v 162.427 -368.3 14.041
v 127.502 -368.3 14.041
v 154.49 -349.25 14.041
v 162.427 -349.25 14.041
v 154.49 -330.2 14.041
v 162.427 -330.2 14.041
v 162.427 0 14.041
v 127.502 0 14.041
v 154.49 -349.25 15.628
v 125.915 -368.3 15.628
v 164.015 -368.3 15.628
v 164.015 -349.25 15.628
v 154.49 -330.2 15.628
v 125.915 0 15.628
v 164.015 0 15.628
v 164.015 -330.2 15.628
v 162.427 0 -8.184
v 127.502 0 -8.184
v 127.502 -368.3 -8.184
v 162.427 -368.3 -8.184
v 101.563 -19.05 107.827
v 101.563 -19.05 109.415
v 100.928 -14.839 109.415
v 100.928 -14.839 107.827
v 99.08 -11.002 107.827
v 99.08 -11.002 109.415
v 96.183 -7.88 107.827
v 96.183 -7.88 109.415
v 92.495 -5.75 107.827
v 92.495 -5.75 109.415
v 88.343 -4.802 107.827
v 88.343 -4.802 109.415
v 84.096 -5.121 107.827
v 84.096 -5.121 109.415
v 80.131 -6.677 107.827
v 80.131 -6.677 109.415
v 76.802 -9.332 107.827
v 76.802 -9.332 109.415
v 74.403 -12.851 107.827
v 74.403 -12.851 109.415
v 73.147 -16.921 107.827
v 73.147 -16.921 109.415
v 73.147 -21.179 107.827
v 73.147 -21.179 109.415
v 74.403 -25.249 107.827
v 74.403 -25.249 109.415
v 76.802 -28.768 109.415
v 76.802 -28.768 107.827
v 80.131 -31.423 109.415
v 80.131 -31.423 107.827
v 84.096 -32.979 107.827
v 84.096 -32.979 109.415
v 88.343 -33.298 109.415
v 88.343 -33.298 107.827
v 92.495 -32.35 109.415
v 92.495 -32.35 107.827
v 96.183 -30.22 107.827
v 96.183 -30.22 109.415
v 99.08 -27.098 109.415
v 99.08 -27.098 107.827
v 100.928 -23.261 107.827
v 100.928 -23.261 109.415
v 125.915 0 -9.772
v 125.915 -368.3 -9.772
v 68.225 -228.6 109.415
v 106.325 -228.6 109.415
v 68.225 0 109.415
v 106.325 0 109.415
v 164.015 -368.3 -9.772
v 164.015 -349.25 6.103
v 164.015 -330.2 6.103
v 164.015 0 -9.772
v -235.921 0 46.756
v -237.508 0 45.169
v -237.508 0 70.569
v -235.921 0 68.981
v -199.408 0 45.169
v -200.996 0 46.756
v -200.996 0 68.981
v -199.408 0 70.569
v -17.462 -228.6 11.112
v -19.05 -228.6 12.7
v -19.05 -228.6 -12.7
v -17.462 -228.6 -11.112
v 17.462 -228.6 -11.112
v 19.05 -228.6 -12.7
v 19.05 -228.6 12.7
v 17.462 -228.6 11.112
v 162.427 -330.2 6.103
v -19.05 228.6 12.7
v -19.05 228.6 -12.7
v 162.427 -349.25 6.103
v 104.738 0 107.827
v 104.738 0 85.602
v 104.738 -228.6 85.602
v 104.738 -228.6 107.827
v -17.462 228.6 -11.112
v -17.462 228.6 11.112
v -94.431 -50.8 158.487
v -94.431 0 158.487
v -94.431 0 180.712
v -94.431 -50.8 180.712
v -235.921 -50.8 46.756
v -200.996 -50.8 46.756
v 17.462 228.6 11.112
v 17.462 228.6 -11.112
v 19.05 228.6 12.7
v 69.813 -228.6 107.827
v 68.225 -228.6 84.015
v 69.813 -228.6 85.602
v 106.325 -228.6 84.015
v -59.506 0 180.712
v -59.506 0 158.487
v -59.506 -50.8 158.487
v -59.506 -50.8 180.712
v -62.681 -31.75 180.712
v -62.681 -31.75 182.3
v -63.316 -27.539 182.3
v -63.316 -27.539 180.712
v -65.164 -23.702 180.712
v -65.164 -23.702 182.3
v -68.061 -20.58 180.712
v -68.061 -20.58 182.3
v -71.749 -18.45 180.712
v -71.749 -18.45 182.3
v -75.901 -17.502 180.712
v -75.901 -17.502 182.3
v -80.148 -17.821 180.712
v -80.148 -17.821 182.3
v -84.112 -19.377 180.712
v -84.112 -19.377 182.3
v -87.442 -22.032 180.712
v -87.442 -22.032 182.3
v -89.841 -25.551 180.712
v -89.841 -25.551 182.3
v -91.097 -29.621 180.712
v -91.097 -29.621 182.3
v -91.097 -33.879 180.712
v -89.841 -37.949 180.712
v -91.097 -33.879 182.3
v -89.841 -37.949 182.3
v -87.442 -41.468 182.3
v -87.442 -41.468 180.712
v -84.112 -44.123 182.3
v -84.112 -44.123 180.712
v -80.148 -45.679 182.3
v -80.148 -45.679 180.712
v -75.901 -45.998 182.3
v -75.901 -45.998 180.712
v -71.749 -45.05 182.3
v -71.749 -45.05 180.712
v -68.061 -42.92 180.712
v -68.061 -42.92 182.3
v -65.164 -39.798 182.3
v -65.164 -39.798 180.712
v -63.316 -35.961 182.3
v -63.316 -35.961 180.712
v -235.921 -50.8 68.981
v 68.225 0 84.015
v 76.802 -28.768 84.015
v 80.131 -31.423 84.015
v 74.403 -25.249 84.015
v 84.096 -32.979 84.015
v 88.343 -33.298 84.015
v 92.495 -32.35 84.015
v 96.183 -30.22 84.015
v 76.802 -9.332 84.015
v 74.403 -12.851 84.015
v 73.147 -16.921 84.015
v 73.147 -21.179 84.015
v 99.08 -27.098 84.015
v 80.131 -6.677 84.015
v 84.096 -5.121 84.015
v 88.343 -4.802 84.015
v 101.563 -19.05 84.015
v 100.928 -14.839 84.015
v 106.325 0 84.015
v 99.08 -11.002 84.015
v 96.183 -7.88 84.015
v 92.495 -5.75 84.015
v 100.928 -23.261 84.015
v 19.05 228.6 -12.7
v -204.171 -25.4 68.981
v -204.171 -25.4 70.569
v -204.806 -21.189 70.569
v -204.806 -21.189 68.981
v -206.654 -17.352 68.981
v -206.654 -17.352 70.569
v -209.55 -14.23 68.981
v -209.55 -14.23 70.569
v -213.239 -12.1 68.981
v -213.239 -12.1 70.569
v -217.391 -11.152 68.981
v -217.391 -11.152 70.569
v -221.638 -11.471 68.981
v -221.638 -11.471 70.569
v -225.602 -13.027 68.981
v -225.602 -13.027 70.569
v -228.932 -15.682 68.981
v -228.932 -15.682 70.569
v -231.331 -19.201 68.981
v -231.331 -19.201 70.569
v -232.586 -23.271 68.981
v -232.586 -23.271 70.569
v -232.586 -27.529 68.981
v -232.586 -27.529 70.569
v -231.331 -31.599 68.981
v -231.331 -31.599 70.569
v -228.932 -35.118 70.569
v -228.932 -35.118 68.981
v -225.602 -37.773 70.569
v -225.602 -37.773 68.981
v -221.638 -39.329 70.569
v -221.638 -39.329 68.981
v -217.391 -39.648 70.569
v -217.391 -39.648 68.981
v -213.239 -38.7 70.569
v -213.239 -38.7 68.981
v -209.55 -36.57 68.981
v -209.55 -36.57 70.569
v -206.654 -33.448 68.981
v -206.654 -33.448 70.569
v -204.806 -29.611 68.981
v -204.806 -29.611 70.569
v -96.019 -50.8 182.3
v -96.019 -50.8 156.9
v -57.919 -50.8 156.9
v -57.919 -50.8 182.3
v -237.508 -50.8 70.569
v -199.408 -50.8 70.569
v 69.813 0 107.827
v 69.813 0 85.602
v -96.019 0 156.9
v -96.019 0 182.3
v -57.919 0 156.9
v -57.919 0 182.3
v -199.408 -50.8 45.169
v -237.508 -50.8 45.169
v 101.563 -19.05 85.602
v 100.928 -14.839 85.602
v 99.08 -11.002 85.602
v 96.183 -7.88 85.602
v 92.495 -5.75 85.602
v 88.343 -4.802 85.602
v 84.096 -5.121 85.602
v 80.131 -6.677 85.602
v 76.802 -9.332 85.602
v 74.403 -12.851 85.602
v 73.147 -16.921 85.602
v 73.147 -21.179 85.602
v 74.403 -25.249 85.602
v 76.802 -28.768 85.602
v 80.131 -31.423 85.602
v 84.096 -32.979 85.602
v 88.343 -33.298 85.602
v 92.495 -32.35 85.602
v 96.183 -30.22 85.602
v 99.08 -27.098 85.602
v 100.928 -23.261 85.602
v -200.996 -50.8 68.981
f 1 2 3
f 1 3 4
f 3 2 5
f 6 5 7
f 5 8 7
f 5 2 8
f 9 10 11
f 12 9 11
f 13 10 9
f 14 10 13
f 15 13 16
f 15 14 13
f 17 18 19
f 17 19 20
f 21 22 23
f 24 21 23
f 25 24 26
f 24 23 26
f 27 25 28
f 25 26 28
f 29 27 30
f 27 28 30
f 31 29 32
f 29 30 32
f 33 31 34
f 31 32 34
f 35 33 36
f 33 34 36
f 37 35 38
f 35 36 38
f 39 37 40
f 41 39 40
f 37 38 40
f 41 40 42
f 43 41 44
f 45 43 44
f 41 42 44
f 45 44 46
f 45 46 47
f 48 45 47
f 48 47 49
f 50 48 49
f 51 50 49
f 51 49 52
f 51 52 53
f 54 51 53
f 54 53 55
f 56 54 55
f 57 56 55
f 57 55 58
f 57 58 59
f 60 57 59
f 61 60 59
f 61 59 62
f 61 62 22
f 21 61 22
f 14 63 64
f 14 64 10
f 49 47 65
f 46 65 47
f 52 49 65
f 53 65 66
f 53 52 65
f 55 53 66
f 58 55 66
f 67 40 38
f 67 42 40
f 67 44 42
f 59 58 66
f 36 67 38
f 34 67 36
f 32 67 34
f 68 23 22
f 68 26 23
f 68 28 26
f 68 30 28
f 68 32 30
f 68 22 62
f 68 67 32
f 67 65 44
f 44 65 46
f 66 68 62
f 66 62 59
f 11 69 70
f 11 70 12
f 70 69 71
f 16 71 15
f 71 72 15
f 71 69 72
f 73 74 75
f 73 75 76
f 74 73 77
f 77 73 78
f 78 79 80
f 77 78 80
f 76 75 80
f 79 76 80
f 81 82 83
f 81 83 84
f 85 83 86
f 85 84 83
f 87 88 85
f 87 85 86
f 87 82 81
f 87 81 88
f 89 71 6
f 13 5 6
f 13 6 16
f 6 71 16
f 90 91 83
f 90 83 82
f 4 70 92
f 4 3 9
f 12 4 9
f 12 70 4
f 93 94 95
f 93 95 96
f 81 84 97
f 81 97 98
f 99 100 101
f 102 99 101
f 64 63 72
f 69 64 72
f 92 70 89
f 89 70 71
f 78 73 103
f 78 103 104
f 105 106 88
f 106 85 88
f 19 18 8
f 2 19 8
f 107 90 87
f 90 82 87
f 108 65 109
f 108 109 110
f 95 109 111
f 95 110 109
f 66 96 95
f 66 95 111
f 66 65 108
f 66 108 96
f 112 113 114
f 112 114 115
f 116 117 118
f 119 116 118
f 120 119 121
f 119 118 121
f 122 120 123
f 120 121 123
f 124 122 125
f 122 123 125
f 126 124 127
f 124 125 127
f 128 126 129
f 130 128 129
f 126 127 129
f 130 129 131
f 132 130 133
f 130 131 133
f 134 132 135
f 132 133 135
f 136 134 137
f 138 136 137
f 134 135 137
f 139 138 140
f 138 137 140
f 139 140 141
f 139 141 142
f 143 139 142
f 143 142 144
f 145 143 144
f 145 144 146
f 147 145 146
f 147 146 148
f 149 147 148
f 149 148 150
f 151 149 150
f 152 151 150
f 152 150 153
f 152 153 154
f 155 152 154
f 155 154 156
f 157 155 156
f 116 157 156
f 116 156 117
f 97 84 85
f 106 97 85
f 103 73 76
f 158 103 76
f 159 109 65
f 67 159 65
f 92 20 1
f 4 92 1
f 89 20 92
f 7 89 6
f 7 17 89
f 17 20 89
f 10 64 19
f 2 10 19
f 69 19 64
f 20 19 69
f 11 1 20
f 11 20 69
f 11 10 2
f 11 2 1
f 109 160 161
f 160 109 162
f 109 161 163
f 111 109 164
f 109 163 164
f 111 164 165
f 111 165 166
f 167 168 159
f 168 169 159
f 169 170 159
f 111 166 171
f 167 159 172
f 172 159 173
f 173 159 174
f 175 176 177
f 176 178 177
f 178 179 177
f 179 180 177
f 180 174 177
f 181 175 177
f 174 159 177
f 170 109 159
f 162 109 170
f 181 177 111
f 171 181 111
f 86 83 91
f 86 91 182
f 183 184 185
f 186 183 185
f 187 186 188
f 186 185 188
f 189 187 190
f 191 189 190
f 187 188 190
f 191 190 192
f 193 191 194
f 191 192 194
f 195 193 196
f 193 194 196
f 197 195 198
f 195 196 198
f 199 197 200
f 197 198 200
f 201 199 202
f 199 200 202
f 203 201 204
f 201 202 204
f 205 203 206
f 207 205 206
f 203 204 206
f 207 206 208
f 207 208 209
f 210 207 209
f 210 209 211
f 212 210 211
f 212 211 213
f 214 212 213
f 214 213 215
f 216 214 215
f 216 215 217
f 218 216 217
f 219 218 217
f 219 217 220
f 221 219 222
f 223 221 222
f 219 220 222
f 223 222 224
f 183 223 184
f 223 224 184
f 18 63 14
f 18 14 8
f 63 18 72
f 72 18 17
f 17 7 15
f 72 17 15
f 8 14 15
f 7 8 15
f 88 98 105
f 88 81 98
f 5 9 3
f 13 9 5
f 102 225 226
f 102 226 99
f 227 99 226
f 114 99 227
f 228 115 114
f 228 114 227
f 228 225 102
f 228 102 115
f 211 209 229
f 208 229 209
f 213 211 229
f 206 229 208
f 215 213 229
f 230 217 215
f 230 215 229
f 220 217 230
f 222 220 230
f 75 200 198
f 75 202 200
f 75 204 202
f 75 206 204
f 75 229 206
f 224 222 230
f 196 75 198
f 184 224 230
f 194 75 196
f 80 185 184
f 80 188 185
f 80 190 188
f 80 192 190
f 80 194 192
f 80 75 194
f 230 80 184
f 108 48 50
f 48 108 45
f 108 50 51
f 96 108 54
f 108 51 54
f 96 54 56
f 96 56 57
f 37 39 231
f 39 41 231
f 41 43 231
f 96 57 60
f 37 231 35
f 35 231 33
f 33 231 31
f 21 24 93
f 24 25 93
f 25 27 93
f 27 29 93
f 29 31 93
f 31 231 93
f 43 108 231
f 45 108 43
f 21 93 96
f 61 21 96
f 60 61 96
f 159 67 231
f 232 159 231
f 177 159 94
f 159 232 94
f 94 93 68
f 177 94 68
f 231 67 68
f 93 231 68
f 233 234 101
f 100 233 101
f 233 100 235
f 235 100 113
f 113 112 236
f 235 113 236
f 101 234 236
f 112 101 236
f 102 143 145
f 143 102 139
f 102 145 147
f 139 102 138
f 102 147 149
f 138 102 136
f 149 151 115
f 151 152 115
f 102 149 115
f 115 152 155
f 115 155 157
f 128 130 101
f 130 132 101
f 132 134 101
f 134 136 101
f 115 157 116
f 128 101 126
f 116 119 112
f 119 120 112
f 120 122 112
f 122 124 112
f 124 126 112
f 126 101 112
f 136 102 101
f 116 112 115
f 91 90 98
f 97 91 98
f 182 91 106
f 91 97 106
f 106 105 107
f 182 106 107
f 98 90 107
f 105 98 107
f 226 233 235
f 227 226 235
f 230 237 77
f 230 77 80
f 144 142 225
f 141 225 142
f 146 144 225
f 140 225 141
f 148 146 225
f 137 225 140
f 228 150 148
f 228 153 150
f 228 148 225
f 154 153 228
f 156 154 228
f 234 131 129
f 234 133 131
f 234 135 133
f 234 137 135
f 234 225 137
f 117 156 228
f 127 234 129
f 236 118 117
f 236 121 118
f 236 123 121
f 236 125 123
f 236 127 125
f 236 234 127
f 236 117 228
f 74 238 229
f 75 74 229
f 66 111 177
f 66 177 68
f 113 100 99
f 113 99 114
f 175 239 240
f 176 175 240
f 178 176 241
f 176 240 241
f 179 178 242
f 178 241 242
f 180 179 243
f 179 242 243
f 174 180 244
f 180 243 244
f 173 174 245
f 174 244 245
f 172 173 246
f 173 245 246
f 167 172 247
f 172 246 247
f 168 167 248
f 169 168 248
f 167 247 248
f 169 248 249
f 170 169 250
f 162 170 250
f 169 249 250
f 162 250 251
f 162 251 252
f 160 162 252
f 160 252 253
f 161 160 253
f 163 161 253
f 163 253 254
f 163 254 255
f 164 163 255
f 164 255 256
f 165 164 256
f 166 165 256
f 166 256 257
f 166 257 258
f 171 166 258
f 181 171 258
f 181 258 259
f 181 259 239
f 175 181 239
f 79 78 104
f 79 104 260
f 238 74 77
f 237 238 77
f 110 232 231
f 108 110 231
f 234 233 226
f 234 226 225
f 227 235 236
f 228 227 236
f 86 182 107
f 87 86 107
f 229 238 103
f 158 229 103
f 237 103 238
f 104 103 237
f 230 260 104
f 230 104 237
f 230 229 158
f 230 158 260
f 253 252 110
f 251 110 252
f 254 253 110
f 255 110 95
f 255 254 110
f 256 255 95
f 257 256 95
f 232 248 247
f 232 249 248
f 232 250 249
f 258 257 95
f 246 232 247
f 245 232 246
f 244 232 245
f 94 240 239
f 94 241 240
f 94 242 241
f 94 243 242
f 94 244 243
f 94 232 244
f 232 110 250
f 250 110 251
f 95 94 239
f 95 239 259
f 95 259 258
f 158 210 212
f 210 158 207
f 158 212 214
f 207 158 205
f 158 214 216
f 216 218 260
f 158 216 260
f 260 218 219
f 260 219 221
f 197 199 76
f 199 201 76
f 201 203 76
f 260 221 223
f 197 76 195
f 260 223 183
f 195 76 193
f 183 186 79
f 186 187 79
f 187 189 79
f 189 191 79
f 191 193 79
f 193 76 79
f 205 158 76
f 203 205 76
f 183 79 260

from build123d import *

# Parameters (mm, degrees)
F0_W      = 38.1
F0_H      = 25.4
F0_W_2    = 34.925
F0_H_2    = 22.225
F1_DEPTH  = 228.6
F2_W      = 38.1
F2_H      = 25.4
F2_W_2    = 34.925
F2_H_2    = 22.225
F3_DEPTH  = 228.6
F4_W      = 38.1
F4_H      = 25.4
F4_W_2    = 34.925
F4_H_2    = 22.225
F5_DEPTH  = 50.8
F6_W      = 38.1
F6_H      = 25.4
F6_W_2    = 34.925
F6_H_2    = 22.225
F7_DEPTH  = 50.8
F8_R      = 14.2875
F9_DEPTH  = 1.5875
F10_R     = 14.2875
F11_DEPTH = 12.7
F12_R     = 14.2875
F13_DEPTH = 122.115541
F14_W     = 38.1
F14_H     = 25.4
F14_W_2   = 34.925
F14_H_2   = 22.225
F15_DEPTH = 368.3
F16_W     = 19.05
F16_H     = 9.525
F17_DEPTH = 9.525


with BuildPart() as f1:
    # F0 (on Front) → F1 (new body, symmetric)
    with BuildSketch(Plane.XZ):
        Rectangle(F0_W, F0_H)
        Rectangle(F0_W_2, F0_H_2, mode=Mode.SUBTRACT)
    extrude(amount=F1_DEPTH, both=True)


with BuildPart() as f3:
    # F2 (on Front) → F3 (new body)
    with BuildSketch(Plane.XZ):
        with Locations((87.275213, 96.714541)):
            Rectangle(F2_W, F2_H)
        with Locations((87.275213, 96.714541)):
            Rectangle(F2_W_2, F2_H_2, mode=Mode.SUBTRACT)
    extrude(amount=F3_DEPTH)

    # F12 (on face) → F13 (cut, through all)
    with BuildSketch(Plane.XY.offset(109.414541)):
        with Locations((87.275213, -19.05)):
            Circle(F12_R)
    extrude(amount=-F13_DEPTH, mode=Mode.SUBTRACT)


with BuildPart() as f5:
    # F4 (on Front) → F5 (new body)
    with BuildSketch(Plane.XZ):
        with Locations((-76.968681, 169.599749)):
            Rectangle(F4_W, F4_H)
        with Locations((-76.968681, 169.599749)):
            Rectangle(F4_W_2, F4_H_2, mode=Mode.SUBTRACT)
    extrude(amount=F5_DEPTH)

    # F10 (on face) → F11 (cut)
    with BuildSketch(Plane.XY.offset(182.299749)):
        with Locations((-76.968681, -31.75)):
            Circle(F10_R)
    extrude(amount=-F11_DEPTH, mode=Mode.SUBTRACT)


with BuildPart() as f7:
    # F6 (on Front) → F7 (new body)
    with BuildSketch(Plane.XZ):
        with Locations((-218.458414, 57.868749)):
            Rectangle(F6_W, F6_H)
        with Locations((-218.458414, 57.868749)):
            Rectangle(F6_W_2, F6_H_2, mode=Mode.SUBTRACT)
    extrude(amount=F7_DEPTH)

    # F8 (on face) → F9 (cut, through all)
    with BuildSketch(Plane.XY.offset(70.568749)):
        with Locations((-218.458414, -25.4)):
            Circle(F8_R)
    extrude(amount=-F9_DEPTH, mode=Mode.SUBTRACT)


with BuildPart() as f15:
    # F14 (on Front) → F15 (new body)
    with BuildSketch(Plane.XZ):
        with Locations((144.964533, 2.928331)):
            Rectangle(F14_W, F14_H)
        with Locations((144.964533, 2.928331)):
            Rectangle(F14_W_2, F14_H_2, mode=Mode.SUBTRACT)
    extrude(amount=F15_DEPTH)

    # F16 (on face) → F17 (cut)
    with BuildSketch(Plane.YZ.offset(164.014533)):
        with Locations((-339.725, 10.865831)):
            Rectangle(F16_W, F16_H)
    extrude(amount=-F17_DEPTH, mode=Mode.SUBTRACT)


solid = Compound([f1.part, f3.part, f5.part, f7.part, f15.part])
